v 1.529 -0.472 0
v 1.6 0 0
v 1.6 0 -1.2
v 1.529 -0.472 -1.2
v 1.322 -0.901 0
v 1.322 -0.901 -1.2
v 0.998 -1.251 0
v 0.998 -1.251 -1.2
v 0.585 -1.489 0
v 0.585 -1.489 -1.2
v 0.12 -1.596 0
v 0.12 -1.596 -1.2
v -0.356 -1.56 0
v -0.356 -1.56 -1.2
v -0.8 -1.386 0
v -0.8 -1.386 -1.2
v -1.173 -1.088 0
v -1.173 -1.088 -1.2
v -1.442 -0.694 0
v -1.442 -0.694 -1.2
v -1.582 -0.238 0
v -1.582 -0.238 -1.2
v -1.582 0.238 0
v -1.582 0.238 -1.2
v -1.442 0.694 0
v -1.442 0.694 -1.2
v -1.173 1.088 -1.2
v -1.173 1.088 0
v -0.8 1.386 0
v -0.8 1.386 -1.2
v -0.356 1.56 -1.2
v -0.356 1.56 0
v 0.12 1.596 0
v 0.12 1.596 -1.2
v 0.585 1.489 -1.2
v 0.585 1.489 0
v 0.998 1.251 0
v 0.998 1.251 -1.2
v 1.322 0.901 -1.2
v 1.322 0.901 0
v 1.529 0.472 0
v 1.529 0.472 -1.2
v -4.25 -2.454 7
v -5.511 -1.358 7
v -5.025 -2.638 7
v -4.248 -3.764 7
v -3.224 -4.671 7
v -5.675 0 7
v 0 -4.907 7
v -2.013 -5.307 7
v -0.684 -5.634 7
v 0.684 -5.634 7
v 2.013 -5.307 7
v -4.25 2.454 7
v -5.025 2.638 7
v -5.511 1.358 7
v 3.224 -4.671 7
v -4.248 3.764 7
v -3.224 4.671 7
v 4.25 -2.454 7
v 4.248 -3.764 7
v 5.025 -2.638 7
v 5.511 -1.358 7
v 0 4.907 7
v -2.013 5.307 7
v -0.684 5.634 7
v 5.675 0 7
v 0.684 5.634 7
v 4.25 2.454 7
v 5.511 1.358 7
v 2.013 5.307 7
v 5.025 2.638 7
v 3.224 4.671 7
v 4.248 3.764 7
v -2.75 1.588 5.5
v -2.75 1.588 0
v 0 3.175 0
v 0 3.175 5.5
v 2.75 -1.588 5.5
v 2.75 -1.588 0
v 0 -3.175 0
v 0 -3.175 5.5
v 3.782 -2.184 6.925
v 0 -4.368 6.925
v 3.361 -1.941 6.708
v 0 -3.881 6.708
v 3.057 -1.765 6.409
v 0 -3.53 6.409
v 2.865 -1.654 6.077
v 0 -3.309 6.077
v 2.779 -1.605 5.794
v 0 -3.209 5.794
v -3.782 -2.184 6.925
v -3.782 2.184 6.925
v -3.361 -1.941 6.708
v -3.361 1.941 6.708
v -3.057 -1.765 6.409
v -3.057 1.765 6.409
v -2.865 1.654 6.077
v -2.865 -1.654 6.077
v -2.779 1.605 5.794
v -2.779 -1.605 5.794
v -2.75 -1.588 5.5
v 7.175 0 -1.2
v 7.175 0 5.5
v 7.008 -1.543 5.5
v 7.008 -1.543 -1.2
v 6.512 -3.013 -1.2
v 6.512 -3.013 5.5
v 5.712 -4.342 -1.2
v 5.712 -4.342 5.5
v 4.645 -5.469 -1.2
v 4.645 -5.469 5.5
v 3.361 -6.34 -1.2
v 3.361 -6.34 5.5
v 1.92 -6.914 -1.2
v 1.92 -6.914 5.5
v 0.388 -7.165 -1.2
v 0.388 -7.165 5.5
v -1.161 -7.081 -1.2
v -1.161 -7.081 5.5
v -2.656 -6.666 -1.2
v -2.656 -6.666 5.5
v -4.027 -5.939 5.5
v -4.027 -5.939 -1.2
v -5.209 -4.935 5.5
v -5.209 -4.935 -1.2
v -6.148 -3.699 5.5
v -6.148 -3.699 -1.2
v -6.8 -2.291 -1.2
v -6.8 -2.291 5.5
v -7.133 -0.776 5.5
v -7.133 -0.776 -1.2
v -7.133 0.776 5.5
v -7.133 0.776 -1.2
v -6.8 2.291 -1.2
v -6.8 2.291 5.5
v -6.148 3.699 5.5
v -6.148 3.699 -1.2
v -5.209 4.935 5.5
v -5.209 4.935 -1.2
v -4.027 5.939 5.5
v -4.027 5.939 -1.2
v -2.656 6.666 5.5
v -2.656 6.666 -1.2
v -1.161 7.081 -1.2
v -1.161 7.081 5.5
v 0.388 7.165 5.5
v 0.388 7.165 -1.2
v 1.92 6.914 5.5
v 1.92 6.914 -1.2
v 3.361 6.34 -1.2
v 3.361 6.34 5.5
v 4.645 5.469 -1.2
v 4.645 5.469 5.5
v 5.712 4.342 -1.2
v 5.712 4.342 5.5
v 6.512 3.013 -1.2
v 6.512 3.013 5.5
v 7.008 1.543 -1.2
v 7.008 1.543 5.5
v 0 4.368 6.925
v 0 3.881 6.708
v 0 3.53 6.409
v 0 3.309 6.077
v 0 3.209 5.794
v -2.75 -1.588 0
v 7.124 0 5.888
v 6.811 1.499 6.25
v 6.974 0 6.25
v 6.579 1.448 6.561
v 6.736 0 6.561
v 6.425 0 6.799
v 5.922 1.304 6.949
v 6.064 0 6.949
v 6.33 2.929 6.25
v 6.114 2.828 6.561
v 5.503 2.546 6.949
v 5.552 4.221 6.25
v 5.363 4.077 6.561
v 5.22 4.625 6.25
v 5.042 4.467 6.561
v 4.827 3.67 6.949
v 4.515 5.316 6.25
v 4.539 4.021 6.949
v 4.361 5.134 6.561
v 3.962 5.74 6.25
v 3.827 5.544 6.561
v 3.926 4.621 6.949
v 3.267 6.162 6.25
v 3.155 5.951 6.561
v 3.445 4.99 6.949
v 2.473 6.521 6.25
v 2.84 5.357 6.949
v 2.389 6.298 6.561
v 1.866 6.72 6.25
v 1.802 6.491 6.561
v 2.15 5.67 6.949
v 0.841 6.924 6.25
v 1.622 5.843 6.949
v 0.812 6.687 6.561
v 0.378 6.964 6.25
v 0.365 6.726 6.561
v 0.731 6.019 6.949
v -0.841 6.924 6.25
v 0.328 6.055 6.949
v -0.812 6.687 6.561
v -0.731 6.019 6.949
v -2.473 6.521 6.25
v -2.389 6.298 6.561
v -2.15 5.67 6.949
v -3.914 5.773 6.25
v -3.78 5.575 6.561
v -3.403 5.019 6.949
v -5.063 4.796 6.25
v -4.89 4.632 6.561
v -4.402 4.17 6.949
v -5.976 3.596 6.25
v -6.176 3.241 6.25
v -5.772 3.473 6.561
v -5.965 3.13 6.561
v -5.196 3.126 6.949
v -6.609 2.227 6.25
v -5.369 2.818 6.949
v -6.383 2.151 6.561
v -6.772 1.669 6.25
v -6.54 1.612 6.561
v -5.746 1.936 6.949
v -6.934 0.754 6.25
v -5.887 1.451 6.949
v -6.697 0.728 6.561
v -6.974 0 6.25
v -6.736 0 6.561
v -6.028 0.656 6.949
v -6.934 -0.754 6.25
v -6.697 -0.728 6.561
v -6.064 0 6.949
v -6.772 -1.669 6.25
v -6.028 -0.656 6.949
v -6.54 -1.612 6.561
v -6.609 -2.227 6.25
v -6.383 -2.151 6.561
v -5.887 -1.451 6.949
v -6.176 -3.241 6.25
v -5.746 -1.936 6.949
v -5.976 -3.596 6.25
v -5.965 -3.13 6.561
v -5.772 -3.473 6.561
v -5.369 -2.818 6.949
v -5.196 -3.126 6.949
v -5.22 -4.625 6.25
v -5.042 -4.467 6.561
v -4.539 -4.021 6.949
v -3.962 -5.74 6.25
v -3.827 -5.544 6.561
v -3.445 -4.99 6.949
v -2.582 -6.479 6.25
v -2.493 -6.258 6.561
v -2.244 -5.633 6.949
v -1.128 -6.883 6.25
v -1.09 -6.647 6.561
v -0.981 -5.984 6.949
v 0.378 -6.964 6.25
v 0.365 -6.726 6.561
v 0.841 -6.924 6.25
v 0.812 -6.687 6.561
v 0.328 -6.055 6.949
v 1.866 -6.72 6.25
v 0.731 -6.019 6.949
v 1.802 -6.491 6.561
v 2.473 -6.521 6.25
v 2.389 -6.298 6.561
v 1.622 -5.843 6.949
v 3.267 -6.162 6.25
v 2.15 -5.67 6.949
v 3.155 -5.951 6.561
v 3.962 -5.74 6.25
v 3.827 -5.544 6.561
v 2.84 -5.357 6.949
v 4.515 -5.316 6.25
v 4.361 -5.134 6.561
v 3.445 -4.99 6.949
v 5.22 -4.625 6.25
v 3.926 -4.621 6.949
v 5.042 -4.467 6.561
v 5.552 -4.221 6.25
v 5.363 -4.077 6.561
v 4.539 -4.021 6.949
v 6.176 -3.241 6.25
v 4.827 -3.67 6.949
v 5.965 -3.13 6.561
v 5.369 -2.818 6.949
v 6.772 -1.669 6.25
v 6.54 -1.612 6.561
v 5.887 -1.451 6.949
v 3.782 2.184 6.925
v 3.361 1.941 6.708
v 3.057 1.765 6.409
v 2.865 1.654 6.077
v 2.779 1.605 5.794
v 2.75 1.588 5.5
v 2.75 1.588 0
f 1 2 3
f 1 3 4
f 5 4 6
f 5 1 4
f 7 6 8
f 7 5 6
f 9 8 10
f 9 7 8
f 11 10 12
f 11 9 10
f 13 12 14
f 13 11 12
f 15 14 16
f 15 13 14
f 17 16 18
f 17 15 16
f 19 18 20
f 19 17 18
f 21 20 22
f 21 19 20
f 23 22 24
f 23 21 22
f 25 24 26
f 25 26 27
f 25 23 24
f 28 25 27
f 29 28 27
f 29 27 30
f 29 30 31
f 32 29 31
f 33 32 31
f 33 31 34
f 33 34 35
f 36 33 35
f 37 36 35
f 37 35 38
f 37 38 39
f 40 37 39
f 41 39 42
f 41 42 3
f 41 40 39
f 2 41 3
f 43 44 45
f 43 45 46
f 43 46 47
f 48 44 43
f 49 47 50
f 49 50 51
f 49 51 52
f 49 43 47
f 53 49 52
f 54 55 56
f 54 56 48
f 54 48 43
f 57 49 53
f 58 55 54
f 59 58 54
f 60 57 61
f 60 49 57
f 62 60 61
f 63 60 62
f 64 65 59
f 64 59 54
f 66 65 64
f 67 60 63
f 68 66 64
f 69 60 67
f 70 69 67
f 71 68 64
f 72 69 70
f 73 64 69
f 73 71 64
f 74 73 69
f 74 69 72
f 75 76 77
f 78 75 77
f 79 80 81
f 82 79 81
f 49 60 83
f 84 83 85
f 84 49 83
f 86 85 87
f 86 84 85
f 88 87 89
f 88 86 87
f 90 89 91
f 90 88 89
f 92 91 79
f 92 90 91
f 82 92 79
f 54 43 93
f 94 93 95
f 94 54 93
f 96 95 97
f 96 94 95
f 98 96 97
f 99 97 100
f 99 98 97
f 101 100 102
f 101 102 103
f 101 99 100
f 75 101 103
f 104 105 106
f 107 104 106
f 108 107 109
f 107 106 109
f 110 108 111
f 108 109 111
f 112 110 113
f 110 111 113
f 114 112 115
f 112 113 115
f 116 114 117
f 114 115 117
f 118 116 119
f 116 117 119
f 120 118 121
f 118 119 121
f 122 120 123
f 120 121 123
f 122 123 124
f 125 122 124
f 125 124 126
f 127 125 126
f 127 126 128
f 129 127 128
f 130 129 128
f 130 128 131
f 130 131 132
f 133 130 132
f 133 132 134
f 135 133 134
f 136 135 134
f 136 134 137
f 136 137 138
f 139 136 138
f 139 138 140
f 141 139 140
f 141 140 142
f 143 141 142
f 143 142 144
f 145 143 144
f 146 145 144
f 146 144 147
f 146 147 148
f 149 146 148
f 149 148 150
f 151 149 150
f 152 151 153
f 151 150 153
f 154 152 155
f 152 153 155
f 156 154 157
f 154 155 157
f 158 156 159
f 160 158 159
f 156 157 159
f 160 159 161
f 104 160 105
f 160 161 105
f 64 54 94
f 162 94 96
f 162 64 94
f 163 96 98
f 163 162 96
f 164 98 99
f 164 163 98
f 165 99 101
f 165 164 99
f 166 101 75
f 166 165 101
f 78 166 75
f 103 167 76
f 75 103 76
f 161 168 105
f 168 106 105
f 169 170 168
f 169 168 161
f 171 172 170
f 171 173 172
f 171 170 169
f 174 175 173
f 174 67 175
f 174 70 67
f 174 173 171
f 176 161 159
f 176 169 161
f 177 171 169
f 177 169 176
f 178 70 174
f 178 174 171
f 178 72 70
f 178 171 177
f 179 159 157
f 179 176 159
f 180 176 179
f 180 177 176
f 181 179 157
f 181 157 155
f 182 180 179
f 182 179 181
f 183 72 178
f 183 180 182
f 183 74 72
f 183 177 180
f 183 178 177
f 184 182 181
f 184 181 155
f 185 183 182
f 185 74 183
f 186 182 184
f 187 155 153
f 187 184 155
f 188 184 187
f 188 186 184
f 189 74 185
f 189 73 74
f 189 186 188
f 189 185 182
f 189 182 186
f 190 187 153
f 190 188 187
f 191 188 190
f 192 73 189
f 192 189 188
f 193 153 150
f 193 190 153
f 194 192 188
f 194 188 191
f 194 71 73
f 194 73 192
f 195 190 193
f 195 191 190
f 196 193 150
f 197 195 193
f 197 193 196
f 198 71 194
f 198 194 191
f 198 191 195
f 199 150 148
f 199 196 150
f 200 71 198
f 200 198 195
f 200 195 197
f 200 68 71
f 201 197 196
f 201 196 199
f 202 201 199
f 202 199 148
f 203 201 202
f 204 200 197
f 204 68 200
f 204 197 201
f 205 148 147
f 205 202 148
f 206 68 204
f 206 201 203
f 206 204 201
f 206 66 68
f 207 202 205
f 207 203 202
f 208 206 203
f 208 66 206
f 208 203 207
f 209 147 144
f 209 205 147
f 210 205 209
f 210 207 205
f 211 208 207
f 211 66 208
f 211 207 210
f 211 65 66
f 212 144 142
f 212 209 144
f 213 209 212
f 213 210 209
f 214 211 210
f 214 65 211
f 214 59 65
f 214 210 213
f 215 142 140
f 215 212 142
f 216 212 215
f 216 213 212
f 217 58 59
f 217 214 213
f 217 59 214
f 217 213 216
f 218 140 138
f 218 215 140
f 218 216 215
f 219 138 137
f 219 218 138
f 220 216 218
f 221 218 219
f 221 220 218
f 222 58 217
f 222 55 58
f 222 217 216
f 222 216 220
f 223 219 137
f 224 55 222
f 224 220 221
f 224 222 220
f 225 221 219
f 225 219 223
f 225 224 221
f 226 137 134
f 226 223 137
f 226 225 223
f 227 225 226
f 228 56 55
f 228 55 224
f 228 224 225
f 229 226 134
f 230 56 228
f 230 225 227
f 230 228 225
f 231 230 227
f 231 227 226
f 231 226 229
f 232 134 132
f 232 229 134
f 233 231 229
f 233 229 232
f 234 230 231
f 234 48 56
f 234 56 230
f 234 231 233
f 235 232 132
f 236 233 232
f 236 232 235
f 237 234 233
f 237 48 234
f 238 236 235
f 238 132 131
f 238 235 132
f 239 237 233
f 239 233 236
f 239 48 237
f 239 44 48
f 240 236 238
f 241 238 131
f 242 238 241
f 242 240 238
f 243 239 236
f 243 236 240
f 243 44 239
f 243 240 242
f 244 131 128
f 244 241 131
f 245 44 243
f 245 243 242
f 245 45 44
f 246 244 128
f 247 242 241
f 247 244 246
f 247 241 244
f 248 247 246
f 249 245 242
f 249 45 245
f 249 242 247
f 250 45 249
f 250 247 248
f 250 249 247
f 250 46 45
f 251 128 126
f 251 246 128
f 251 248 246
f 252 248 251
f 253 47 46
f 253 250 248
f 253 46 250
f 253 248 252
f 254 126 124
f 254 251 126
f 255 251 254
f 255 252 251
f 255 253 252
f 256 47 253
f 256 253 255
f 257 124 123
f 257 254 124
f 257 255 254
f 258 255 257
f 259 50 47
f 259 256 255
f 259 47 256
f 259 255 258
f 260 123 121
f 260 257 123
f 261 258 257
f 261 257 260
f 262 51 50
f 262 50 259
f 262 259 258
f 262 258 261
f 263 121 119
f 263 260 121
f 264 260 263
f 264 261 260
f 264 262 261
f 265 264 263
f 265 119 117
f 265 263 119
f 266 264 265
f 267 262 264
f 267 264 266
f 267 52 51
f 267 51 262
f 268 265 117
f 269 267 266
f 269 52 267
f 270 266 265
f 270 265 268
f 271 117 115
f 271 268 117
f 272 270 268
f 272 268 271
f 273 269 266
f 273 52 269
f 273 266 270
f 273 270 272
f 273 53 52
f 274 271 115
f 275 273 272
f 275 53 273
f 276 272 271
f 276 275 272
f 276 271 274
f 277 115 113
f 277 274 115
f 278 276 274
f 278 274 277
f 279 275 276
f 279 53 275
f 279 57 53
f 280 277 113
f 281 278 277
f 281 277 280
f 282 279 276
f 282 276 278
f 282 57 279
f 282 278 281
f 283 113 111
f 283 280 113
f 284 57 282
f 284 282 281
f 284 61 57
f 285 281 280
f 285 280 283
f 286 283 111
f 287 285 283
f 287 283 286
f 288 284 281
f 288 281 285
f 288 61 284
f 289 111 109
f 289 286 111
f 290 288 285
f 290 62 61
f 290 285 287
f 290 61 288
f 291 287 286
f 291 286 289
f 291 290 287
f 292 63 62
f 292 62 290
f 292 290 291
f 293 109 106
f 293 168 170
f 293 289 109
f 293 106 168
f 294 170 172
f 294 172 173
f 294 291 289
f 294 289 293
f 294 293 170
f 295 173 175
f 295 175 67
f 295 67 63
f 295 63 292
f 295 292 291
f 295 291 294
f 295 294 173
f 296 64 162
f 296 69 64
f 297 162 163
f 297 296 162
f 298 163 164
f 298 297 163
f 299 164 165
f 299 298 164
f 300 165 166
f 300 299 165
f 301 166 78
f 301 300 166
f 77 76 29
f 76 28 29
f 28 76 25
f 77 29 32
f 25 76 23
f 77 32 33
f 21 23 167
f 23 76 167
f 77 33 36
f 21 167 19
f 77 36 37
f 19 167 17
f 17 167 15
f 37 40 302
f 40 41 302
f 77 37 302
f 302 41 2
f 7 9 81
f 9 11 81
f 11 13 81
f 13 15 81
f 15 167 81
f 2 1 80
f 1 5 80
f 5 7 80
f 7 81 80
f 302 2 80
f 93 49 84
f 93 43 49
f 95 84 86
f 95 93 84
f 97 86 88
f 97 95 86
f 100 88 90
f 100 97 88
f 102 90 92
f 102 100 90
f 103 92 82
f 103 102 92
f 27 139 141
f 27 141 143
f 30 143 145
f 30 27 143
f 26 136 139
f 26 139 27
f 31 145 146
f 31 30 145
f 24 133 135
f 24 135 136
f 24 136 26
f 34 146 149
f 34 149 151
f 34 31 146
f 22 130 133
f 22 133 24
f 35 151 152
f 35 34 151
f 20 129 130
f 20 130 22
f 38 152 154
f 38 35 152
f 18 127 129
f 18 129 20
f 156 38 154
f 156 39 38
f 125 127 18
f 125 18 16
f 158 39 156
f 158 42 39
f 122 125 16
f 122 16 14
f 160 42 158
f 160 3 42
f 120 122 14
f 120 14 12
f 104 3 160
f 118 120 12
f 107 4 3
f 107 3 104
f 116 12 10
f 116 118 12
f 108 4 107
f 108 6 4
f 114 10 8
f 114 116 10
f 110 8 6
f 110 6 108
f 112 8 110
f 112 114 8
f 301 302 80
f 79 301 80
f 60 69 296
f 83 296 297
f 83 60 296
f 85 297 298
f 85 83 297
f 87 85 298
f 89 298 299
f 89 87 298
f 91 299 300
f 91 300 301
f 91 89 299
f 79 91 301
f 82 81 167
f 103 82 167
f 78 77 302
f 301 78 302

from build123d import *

# Parameters (mm, degrees)
F0_R     = 7.175426
F1_DEPTH = 7
F2_R     = 7.175426
F2_R_2   = 1.6
F3_DEPTH = 1.2
F4_R     = 1.5


with BuildPart() as f1:
    # F0 (on Top) → F1 (new body)
    with BuildSketch(Plane.XY):
        Circle(F0_R)
        Polygon((0, -3.175426), (-2.75, -1.587713), (-2.75, 1.587713), (0, 3.175426), (2.75, 1.587713), (2.75, -1.587713), align=None, mode=Mode.SUBTRACT)
    extrude(amount=F1_DEPTH)

    # F2 (on face) → F3 (join)
    with BuildSketch(Plane(origin=(0, 0, 0), x_dir=(1, 0, 0), z_dir=(0, 0, -1))):
        Circle(F2_R)
        Circle(F2_R_2, mode=Mode.SUBTRACT)
    extrude(amount=F3_DEPTH)

    # F4
    f4_edges = [f1.edges().sort_by_distance(p)[0] for p in [
        (-7.175426, 0, 7),
        (-1.375, -2.38157, 7),
        (-2.75, 0, 7),
        (-1.375, 2.38157, 7),
        (1.375, 2.38157, 7),
        (2.75, 0, 7),
        (1.375, -2.38157, 7),
    ]]
    fillet(f4_edges, radius=F4_R)


solid = f1.part
